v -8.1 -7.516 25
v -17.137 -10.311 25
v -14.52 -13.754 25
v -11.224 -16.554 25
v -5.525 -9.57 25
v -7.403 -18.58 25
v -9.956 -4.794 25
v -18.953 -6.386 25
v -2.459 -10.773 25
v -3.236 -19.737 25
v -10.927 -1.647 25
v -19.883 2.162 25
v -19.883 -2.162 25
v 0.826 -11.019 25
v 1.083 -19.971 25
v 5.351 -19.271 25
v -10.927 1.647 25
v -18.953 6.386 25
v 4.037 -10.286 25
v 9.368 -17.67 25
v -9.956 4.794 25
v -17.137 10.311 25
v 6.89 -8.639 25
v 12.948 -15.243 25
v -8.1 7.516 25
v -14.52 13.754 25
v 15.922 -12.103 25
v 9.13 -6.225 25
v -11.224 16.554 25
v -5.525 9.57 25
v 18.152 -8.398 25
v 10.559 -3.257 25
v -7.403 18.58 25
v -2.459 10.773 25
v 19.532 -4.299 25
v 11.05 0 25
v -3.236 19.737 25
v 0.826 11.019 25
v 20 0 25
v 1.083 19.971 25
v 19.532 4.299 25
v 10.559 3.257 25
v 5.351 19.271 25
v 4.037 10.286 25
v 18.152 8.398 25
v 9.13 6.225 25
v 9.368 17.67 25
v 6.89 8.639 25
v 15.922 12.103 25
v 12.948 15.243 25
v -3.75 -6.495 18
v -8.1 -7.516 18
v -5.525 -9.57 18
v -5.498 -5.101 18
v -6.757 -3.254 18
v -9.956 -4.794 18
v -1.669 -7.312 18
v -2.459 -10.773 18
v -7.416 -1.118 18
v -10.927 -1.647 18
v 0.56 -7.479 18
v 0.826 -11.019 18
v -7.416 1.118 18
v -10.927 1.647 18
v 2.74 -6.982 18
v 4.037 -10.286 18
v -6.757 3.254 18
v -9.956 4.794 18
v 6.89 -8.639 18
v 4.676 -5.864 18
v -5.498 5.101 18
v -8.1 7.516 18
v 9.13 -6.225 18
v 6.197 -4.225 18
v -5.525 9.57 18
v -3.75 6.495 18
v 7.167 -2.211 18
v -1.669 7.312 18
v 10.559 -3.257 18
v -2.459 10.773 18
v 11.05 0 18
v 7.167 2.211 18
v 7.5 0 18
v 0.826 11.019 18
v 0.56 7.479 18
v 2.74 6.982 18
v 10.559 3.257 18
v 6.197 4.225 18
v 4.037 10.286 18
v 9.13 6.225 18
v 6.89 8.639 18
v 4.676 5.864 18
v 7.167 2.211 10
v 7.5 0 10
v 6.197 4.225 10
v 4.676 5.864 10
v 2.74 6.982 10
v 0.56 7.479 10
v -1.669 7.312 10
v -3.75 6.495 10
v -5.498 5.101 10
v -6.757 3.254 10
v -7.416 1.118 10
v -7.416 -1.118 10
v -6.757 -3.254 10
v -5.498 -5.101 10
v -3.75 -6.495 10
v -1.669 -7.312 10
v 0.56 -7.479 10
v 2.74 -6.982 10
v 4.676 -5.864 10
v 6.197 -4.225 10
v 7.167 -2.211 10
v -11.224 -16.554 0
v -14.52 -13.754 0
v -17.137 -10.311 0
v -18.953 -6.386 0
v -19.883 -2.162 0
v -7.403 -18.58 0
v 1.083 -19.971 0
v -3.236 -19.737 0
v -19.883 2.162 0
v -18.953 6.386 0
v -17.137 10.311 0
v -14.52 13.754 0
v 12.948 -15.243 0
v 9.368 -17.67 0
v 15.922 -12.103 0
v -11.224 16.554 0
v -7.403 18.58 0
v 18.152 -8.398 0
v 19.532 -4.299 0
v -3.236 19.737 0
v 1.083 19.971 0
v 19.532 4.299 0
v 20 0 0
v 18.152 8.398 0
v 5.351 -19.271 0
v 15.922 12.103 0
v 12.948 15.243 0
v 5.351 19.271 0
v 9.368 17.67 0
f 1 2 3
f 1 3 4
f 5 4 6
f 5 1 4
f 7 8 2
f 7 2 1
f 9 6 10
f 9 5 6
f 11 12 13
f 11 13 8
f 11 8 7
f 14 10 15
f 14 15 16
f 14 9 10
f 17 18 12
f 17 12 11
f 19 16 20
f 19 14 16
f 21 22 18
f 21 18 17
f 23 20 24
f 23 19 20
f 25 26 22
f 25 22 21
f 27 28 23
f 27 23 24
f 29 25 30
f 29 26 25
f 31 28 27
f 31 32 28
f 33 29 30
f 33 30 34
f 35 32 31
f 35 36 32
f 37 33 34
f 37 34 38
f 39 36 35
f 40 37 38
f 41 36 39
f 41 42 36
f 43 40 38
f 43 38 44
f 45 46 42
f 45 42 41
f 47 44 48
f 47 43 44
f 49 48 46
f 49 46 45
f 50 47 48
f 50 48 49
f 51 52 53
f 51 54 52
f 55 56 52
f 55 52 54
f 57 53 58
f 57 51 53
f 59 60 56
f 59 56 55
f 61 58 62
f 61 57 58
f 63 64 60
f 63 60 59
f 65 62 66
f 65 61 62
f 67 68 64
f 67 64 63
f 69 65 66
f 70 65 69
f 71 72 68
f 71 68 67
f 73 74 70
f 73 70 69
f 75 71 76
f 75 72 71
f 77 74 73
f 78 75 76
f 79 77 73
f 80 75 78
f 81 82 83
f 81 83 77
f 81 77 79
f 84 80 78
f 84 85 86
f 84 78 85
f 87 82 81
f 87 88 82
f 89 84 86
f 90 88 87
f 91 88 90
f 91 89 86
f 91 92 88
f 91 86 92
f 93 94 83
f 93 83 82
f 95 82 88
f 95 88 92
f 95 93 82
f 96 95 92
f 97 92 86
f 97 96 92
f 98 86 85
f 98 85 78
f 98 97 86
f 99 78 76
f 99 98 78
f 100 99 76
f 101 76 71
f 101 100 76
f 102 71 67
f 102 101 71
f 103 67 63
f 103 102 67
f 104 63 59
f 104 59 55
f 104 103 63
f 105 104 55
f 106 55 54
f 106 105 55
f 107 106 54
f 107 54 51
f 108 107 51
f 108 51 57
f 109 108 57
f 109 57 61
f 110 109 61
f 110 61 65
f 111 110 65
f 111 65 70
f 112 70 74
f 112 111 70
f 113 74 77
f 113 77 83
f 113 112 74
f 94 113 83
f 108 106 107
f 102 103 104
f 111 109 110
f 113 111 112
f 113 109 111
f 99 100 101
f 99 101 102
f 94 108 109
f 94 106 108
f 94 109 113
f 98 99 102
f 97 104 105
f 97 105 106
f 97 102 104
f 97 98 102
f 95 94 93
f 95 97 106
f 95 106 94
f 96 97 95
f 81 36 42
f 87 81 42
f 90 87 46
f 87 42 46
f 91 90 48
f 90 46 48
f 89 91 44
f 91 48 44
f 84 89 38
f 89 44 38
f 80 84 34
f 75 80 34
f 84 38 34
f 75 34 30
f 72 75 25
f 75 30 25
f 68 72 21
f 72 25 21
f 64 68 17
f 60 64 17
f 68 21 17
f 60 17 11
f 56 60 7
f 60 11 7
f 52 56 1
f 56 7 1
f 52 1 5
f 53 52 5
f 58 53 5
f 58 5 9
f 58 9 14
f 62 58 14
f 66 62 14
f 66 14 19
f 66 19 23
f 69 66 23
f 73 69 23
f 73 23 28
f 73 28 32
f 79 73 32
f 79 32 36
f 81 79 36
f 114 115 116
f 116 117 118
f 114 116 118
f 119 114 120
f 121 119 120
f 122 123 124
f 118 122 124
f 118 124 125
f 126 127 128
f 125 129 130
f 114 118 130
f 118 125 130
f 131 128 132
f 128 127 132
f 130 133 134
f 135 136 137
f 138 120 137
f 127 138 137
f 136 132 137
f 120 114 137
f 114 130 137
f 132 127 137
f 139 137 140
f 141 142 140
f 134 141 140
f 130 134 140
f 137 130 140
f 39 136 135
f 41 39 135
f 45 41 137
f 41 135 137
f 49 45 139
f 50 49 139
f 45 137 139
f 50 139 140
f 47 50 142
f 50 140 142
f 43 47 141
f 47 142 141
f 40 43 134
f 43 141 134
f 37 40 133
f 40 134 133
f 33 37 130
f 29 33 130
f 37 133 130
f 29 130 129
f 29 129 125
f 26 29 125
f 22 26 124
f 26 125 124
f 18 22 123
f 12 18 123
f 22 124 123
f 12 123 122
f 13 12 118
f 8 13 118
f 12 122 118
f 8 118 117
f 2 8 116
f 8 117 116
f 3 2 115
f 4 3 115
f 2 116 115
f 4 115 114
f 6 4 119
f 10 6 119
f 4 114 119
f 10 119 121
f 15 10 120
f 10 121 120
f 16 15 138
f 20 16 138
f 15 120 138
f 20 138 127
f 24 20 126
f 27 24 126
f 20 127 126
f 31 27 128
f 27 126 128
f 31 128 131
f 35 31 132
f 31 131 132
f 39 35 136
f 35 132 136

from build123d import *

# Parameters (mm, degrees)
F0_R     = 20
F1_DEPTH = 25
F2_R     = 11.05
F3_DEPTH = 15
F4_R     = 11.05
F4_R_2   = 7.5
F5_DEPTH = 8


with BuildPart() as f1:
    # F0 (on Top) → F1 (new body)
    with BuildSketch(Plane.XY):
        Circle(F0_R)
    extrude(amount=F1_DEPTH)

    # F2 (on face) → F3 (cut)
    with BuildSketch(Plane.XY.offset(25)):
        Circle(F2_R)
    extrude(amount=-F3_DEPTH, mode=Mode.SUBTRACT)

    # F4 (on face) → F5 (join)
    with BuildSketch(Plane.XY.offset(10)):
        Circle(F4_R)
        Circle(F4_R_2, mode=Mode.SUBTRACT)
    extrude(amount=F5_DEPTH)


solid = f1.part
